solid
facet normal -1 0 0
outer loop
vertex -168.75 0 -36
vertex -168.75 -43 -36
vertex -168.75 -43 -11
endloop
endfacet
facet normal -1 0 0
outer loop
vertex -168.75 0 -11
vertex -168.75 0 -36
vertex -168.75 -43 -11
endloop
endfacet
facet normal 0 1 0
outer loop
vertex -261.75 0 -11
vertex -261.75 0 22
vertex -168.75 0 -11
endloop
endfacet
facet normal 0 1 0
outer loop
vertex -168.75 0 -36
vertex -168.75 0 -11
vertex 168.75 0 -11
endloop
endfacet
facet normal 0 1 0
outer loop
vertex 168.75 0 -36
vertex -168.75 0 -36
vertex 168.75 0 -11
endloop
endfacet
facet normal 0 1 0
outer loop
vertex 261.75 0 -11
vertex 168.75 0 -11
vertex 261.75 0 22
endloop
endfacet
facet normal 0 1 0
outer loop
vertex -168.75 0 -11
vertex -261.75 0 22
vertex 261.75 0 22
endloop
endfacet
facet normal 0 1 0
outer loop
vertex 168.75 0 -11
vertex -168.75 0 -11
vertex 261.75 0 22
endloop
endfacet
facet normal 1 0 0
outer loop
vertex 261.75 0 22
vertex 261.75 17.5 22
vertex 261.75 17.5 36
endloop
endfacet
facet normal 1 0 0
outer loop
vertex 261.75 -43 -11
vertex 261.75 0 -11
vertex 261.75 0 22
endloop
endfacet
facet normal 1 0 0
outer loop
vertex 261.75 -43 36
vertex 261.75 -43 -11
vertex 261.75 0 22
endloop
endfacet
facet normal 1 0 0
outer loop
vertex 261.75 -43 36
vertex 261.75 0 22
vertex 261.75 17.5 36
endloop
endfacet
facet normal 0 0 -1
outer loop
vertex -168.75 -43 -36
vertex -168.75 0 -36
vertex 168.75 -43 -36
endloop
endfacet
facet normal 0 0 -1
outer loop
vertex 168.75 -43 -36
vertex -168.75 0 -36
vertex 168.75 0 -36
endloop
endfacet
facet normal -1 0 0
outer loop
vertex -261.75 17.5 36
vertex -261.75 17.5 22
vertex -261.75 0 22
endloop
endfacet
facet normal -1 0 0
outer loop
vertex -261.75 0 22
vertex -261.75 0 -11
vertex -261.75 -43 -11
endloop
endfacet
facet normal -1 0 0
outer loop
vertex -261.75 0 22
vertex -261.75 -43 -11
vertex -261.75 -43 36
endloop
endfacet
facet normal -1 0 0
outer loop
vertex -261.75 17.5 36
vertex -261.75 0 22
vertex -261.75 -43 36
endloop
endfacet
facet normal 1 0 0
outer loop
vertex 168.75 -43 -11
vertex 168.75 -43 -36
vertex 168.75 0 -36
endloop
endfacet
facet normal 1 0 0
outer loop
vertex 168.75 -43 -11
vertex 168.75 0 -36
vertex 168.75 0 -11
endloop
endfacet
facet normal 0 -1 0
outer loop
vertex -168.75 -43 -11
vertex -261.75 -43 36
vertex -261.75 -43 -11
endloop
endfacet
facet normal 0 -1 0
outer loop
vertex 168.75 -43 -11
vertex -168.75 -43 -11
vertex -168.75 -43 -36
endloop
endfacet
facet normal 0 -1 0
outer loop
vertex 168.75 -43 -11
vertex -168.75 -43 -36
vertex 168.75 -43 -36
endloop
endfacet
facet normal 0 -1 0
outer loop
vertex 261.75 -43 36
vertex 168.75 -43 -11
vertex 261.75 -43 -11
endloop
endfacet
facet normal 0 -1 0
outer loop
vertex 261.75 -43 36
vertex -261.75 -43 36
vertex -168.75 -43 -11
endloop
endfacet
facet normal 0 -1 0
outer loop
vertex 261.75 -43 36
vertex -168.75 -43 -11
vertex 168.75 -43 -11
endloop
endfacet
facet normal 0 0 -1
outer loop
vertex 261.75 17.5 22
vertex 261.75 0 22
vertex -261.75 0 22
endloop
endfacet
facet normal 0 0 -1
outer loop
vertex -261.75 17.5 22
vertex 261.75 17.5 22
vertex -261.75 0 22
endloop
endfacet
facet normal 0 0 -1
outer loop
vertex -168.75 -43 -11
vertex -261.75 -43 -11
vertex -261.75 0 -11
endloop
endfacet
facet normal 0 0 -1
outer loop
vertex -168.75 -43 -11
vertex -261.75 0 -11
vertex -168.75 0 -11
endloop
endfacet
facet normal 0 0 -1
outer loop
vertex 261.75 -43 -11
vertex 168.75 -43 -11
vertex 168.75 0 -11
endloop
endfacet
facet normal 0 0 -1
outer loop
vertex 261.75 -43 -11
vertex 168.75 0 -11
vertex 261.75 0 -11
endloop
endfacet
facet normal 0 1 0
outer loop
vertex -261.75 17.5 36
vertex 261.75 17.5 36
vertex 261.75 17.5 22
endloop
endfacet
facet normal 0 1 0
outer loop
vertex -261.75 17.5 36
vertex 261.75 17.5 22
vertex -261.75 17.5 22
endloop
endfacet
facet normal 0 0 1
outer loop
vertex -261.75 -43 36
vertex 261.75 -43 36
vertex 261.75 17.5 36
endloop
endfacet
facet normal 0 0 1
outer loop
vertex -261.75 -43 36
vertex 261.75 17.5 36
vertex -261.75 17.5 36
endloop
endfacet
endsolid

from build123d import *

# Parameters (mm, degrees)
F0_W     = 523.5
F0_H     = 72
F1_DEPTH = 43
F2_W     = 93
F2_H     = 25
F3_DEPTH = 93
F4_W     = 523.5
F4_H     = 14
F5_DEPTH = 17.5


with BuildPart() as f1:
    # F0 (on Front) → F1 (new body)
    with BuildSketch(Plane.XZ):
        Rectangle(F0_W, F0_H)
    extrude(amount=F1_DEPTH)

    # F2 (on face) → F3 (cut)
    with BuildSketch(Plane.XZ.offset(43)):
        with Locations((-215.25, -23.5)):
            Rectangle(F2_W, F2_H)
        with Locations((215.25, -23.5)):
            Rectangle(F2_W, F2_H)
    extrude(amount=-F3_DEPTH, mode=Mode.SUBTRACT)

    # F4 (on face) → F5 (join)
    with BuildSketch(Plane(origin=(0, 0, 0), x_dir=(-1, 0, 0), z_dir=(0, 1, 0))):
        with Locations((0, 29)):
            Rectangle(F4_W, F4_H)
    extrude(amount=F5_DEPTH)


solid = f1.part
